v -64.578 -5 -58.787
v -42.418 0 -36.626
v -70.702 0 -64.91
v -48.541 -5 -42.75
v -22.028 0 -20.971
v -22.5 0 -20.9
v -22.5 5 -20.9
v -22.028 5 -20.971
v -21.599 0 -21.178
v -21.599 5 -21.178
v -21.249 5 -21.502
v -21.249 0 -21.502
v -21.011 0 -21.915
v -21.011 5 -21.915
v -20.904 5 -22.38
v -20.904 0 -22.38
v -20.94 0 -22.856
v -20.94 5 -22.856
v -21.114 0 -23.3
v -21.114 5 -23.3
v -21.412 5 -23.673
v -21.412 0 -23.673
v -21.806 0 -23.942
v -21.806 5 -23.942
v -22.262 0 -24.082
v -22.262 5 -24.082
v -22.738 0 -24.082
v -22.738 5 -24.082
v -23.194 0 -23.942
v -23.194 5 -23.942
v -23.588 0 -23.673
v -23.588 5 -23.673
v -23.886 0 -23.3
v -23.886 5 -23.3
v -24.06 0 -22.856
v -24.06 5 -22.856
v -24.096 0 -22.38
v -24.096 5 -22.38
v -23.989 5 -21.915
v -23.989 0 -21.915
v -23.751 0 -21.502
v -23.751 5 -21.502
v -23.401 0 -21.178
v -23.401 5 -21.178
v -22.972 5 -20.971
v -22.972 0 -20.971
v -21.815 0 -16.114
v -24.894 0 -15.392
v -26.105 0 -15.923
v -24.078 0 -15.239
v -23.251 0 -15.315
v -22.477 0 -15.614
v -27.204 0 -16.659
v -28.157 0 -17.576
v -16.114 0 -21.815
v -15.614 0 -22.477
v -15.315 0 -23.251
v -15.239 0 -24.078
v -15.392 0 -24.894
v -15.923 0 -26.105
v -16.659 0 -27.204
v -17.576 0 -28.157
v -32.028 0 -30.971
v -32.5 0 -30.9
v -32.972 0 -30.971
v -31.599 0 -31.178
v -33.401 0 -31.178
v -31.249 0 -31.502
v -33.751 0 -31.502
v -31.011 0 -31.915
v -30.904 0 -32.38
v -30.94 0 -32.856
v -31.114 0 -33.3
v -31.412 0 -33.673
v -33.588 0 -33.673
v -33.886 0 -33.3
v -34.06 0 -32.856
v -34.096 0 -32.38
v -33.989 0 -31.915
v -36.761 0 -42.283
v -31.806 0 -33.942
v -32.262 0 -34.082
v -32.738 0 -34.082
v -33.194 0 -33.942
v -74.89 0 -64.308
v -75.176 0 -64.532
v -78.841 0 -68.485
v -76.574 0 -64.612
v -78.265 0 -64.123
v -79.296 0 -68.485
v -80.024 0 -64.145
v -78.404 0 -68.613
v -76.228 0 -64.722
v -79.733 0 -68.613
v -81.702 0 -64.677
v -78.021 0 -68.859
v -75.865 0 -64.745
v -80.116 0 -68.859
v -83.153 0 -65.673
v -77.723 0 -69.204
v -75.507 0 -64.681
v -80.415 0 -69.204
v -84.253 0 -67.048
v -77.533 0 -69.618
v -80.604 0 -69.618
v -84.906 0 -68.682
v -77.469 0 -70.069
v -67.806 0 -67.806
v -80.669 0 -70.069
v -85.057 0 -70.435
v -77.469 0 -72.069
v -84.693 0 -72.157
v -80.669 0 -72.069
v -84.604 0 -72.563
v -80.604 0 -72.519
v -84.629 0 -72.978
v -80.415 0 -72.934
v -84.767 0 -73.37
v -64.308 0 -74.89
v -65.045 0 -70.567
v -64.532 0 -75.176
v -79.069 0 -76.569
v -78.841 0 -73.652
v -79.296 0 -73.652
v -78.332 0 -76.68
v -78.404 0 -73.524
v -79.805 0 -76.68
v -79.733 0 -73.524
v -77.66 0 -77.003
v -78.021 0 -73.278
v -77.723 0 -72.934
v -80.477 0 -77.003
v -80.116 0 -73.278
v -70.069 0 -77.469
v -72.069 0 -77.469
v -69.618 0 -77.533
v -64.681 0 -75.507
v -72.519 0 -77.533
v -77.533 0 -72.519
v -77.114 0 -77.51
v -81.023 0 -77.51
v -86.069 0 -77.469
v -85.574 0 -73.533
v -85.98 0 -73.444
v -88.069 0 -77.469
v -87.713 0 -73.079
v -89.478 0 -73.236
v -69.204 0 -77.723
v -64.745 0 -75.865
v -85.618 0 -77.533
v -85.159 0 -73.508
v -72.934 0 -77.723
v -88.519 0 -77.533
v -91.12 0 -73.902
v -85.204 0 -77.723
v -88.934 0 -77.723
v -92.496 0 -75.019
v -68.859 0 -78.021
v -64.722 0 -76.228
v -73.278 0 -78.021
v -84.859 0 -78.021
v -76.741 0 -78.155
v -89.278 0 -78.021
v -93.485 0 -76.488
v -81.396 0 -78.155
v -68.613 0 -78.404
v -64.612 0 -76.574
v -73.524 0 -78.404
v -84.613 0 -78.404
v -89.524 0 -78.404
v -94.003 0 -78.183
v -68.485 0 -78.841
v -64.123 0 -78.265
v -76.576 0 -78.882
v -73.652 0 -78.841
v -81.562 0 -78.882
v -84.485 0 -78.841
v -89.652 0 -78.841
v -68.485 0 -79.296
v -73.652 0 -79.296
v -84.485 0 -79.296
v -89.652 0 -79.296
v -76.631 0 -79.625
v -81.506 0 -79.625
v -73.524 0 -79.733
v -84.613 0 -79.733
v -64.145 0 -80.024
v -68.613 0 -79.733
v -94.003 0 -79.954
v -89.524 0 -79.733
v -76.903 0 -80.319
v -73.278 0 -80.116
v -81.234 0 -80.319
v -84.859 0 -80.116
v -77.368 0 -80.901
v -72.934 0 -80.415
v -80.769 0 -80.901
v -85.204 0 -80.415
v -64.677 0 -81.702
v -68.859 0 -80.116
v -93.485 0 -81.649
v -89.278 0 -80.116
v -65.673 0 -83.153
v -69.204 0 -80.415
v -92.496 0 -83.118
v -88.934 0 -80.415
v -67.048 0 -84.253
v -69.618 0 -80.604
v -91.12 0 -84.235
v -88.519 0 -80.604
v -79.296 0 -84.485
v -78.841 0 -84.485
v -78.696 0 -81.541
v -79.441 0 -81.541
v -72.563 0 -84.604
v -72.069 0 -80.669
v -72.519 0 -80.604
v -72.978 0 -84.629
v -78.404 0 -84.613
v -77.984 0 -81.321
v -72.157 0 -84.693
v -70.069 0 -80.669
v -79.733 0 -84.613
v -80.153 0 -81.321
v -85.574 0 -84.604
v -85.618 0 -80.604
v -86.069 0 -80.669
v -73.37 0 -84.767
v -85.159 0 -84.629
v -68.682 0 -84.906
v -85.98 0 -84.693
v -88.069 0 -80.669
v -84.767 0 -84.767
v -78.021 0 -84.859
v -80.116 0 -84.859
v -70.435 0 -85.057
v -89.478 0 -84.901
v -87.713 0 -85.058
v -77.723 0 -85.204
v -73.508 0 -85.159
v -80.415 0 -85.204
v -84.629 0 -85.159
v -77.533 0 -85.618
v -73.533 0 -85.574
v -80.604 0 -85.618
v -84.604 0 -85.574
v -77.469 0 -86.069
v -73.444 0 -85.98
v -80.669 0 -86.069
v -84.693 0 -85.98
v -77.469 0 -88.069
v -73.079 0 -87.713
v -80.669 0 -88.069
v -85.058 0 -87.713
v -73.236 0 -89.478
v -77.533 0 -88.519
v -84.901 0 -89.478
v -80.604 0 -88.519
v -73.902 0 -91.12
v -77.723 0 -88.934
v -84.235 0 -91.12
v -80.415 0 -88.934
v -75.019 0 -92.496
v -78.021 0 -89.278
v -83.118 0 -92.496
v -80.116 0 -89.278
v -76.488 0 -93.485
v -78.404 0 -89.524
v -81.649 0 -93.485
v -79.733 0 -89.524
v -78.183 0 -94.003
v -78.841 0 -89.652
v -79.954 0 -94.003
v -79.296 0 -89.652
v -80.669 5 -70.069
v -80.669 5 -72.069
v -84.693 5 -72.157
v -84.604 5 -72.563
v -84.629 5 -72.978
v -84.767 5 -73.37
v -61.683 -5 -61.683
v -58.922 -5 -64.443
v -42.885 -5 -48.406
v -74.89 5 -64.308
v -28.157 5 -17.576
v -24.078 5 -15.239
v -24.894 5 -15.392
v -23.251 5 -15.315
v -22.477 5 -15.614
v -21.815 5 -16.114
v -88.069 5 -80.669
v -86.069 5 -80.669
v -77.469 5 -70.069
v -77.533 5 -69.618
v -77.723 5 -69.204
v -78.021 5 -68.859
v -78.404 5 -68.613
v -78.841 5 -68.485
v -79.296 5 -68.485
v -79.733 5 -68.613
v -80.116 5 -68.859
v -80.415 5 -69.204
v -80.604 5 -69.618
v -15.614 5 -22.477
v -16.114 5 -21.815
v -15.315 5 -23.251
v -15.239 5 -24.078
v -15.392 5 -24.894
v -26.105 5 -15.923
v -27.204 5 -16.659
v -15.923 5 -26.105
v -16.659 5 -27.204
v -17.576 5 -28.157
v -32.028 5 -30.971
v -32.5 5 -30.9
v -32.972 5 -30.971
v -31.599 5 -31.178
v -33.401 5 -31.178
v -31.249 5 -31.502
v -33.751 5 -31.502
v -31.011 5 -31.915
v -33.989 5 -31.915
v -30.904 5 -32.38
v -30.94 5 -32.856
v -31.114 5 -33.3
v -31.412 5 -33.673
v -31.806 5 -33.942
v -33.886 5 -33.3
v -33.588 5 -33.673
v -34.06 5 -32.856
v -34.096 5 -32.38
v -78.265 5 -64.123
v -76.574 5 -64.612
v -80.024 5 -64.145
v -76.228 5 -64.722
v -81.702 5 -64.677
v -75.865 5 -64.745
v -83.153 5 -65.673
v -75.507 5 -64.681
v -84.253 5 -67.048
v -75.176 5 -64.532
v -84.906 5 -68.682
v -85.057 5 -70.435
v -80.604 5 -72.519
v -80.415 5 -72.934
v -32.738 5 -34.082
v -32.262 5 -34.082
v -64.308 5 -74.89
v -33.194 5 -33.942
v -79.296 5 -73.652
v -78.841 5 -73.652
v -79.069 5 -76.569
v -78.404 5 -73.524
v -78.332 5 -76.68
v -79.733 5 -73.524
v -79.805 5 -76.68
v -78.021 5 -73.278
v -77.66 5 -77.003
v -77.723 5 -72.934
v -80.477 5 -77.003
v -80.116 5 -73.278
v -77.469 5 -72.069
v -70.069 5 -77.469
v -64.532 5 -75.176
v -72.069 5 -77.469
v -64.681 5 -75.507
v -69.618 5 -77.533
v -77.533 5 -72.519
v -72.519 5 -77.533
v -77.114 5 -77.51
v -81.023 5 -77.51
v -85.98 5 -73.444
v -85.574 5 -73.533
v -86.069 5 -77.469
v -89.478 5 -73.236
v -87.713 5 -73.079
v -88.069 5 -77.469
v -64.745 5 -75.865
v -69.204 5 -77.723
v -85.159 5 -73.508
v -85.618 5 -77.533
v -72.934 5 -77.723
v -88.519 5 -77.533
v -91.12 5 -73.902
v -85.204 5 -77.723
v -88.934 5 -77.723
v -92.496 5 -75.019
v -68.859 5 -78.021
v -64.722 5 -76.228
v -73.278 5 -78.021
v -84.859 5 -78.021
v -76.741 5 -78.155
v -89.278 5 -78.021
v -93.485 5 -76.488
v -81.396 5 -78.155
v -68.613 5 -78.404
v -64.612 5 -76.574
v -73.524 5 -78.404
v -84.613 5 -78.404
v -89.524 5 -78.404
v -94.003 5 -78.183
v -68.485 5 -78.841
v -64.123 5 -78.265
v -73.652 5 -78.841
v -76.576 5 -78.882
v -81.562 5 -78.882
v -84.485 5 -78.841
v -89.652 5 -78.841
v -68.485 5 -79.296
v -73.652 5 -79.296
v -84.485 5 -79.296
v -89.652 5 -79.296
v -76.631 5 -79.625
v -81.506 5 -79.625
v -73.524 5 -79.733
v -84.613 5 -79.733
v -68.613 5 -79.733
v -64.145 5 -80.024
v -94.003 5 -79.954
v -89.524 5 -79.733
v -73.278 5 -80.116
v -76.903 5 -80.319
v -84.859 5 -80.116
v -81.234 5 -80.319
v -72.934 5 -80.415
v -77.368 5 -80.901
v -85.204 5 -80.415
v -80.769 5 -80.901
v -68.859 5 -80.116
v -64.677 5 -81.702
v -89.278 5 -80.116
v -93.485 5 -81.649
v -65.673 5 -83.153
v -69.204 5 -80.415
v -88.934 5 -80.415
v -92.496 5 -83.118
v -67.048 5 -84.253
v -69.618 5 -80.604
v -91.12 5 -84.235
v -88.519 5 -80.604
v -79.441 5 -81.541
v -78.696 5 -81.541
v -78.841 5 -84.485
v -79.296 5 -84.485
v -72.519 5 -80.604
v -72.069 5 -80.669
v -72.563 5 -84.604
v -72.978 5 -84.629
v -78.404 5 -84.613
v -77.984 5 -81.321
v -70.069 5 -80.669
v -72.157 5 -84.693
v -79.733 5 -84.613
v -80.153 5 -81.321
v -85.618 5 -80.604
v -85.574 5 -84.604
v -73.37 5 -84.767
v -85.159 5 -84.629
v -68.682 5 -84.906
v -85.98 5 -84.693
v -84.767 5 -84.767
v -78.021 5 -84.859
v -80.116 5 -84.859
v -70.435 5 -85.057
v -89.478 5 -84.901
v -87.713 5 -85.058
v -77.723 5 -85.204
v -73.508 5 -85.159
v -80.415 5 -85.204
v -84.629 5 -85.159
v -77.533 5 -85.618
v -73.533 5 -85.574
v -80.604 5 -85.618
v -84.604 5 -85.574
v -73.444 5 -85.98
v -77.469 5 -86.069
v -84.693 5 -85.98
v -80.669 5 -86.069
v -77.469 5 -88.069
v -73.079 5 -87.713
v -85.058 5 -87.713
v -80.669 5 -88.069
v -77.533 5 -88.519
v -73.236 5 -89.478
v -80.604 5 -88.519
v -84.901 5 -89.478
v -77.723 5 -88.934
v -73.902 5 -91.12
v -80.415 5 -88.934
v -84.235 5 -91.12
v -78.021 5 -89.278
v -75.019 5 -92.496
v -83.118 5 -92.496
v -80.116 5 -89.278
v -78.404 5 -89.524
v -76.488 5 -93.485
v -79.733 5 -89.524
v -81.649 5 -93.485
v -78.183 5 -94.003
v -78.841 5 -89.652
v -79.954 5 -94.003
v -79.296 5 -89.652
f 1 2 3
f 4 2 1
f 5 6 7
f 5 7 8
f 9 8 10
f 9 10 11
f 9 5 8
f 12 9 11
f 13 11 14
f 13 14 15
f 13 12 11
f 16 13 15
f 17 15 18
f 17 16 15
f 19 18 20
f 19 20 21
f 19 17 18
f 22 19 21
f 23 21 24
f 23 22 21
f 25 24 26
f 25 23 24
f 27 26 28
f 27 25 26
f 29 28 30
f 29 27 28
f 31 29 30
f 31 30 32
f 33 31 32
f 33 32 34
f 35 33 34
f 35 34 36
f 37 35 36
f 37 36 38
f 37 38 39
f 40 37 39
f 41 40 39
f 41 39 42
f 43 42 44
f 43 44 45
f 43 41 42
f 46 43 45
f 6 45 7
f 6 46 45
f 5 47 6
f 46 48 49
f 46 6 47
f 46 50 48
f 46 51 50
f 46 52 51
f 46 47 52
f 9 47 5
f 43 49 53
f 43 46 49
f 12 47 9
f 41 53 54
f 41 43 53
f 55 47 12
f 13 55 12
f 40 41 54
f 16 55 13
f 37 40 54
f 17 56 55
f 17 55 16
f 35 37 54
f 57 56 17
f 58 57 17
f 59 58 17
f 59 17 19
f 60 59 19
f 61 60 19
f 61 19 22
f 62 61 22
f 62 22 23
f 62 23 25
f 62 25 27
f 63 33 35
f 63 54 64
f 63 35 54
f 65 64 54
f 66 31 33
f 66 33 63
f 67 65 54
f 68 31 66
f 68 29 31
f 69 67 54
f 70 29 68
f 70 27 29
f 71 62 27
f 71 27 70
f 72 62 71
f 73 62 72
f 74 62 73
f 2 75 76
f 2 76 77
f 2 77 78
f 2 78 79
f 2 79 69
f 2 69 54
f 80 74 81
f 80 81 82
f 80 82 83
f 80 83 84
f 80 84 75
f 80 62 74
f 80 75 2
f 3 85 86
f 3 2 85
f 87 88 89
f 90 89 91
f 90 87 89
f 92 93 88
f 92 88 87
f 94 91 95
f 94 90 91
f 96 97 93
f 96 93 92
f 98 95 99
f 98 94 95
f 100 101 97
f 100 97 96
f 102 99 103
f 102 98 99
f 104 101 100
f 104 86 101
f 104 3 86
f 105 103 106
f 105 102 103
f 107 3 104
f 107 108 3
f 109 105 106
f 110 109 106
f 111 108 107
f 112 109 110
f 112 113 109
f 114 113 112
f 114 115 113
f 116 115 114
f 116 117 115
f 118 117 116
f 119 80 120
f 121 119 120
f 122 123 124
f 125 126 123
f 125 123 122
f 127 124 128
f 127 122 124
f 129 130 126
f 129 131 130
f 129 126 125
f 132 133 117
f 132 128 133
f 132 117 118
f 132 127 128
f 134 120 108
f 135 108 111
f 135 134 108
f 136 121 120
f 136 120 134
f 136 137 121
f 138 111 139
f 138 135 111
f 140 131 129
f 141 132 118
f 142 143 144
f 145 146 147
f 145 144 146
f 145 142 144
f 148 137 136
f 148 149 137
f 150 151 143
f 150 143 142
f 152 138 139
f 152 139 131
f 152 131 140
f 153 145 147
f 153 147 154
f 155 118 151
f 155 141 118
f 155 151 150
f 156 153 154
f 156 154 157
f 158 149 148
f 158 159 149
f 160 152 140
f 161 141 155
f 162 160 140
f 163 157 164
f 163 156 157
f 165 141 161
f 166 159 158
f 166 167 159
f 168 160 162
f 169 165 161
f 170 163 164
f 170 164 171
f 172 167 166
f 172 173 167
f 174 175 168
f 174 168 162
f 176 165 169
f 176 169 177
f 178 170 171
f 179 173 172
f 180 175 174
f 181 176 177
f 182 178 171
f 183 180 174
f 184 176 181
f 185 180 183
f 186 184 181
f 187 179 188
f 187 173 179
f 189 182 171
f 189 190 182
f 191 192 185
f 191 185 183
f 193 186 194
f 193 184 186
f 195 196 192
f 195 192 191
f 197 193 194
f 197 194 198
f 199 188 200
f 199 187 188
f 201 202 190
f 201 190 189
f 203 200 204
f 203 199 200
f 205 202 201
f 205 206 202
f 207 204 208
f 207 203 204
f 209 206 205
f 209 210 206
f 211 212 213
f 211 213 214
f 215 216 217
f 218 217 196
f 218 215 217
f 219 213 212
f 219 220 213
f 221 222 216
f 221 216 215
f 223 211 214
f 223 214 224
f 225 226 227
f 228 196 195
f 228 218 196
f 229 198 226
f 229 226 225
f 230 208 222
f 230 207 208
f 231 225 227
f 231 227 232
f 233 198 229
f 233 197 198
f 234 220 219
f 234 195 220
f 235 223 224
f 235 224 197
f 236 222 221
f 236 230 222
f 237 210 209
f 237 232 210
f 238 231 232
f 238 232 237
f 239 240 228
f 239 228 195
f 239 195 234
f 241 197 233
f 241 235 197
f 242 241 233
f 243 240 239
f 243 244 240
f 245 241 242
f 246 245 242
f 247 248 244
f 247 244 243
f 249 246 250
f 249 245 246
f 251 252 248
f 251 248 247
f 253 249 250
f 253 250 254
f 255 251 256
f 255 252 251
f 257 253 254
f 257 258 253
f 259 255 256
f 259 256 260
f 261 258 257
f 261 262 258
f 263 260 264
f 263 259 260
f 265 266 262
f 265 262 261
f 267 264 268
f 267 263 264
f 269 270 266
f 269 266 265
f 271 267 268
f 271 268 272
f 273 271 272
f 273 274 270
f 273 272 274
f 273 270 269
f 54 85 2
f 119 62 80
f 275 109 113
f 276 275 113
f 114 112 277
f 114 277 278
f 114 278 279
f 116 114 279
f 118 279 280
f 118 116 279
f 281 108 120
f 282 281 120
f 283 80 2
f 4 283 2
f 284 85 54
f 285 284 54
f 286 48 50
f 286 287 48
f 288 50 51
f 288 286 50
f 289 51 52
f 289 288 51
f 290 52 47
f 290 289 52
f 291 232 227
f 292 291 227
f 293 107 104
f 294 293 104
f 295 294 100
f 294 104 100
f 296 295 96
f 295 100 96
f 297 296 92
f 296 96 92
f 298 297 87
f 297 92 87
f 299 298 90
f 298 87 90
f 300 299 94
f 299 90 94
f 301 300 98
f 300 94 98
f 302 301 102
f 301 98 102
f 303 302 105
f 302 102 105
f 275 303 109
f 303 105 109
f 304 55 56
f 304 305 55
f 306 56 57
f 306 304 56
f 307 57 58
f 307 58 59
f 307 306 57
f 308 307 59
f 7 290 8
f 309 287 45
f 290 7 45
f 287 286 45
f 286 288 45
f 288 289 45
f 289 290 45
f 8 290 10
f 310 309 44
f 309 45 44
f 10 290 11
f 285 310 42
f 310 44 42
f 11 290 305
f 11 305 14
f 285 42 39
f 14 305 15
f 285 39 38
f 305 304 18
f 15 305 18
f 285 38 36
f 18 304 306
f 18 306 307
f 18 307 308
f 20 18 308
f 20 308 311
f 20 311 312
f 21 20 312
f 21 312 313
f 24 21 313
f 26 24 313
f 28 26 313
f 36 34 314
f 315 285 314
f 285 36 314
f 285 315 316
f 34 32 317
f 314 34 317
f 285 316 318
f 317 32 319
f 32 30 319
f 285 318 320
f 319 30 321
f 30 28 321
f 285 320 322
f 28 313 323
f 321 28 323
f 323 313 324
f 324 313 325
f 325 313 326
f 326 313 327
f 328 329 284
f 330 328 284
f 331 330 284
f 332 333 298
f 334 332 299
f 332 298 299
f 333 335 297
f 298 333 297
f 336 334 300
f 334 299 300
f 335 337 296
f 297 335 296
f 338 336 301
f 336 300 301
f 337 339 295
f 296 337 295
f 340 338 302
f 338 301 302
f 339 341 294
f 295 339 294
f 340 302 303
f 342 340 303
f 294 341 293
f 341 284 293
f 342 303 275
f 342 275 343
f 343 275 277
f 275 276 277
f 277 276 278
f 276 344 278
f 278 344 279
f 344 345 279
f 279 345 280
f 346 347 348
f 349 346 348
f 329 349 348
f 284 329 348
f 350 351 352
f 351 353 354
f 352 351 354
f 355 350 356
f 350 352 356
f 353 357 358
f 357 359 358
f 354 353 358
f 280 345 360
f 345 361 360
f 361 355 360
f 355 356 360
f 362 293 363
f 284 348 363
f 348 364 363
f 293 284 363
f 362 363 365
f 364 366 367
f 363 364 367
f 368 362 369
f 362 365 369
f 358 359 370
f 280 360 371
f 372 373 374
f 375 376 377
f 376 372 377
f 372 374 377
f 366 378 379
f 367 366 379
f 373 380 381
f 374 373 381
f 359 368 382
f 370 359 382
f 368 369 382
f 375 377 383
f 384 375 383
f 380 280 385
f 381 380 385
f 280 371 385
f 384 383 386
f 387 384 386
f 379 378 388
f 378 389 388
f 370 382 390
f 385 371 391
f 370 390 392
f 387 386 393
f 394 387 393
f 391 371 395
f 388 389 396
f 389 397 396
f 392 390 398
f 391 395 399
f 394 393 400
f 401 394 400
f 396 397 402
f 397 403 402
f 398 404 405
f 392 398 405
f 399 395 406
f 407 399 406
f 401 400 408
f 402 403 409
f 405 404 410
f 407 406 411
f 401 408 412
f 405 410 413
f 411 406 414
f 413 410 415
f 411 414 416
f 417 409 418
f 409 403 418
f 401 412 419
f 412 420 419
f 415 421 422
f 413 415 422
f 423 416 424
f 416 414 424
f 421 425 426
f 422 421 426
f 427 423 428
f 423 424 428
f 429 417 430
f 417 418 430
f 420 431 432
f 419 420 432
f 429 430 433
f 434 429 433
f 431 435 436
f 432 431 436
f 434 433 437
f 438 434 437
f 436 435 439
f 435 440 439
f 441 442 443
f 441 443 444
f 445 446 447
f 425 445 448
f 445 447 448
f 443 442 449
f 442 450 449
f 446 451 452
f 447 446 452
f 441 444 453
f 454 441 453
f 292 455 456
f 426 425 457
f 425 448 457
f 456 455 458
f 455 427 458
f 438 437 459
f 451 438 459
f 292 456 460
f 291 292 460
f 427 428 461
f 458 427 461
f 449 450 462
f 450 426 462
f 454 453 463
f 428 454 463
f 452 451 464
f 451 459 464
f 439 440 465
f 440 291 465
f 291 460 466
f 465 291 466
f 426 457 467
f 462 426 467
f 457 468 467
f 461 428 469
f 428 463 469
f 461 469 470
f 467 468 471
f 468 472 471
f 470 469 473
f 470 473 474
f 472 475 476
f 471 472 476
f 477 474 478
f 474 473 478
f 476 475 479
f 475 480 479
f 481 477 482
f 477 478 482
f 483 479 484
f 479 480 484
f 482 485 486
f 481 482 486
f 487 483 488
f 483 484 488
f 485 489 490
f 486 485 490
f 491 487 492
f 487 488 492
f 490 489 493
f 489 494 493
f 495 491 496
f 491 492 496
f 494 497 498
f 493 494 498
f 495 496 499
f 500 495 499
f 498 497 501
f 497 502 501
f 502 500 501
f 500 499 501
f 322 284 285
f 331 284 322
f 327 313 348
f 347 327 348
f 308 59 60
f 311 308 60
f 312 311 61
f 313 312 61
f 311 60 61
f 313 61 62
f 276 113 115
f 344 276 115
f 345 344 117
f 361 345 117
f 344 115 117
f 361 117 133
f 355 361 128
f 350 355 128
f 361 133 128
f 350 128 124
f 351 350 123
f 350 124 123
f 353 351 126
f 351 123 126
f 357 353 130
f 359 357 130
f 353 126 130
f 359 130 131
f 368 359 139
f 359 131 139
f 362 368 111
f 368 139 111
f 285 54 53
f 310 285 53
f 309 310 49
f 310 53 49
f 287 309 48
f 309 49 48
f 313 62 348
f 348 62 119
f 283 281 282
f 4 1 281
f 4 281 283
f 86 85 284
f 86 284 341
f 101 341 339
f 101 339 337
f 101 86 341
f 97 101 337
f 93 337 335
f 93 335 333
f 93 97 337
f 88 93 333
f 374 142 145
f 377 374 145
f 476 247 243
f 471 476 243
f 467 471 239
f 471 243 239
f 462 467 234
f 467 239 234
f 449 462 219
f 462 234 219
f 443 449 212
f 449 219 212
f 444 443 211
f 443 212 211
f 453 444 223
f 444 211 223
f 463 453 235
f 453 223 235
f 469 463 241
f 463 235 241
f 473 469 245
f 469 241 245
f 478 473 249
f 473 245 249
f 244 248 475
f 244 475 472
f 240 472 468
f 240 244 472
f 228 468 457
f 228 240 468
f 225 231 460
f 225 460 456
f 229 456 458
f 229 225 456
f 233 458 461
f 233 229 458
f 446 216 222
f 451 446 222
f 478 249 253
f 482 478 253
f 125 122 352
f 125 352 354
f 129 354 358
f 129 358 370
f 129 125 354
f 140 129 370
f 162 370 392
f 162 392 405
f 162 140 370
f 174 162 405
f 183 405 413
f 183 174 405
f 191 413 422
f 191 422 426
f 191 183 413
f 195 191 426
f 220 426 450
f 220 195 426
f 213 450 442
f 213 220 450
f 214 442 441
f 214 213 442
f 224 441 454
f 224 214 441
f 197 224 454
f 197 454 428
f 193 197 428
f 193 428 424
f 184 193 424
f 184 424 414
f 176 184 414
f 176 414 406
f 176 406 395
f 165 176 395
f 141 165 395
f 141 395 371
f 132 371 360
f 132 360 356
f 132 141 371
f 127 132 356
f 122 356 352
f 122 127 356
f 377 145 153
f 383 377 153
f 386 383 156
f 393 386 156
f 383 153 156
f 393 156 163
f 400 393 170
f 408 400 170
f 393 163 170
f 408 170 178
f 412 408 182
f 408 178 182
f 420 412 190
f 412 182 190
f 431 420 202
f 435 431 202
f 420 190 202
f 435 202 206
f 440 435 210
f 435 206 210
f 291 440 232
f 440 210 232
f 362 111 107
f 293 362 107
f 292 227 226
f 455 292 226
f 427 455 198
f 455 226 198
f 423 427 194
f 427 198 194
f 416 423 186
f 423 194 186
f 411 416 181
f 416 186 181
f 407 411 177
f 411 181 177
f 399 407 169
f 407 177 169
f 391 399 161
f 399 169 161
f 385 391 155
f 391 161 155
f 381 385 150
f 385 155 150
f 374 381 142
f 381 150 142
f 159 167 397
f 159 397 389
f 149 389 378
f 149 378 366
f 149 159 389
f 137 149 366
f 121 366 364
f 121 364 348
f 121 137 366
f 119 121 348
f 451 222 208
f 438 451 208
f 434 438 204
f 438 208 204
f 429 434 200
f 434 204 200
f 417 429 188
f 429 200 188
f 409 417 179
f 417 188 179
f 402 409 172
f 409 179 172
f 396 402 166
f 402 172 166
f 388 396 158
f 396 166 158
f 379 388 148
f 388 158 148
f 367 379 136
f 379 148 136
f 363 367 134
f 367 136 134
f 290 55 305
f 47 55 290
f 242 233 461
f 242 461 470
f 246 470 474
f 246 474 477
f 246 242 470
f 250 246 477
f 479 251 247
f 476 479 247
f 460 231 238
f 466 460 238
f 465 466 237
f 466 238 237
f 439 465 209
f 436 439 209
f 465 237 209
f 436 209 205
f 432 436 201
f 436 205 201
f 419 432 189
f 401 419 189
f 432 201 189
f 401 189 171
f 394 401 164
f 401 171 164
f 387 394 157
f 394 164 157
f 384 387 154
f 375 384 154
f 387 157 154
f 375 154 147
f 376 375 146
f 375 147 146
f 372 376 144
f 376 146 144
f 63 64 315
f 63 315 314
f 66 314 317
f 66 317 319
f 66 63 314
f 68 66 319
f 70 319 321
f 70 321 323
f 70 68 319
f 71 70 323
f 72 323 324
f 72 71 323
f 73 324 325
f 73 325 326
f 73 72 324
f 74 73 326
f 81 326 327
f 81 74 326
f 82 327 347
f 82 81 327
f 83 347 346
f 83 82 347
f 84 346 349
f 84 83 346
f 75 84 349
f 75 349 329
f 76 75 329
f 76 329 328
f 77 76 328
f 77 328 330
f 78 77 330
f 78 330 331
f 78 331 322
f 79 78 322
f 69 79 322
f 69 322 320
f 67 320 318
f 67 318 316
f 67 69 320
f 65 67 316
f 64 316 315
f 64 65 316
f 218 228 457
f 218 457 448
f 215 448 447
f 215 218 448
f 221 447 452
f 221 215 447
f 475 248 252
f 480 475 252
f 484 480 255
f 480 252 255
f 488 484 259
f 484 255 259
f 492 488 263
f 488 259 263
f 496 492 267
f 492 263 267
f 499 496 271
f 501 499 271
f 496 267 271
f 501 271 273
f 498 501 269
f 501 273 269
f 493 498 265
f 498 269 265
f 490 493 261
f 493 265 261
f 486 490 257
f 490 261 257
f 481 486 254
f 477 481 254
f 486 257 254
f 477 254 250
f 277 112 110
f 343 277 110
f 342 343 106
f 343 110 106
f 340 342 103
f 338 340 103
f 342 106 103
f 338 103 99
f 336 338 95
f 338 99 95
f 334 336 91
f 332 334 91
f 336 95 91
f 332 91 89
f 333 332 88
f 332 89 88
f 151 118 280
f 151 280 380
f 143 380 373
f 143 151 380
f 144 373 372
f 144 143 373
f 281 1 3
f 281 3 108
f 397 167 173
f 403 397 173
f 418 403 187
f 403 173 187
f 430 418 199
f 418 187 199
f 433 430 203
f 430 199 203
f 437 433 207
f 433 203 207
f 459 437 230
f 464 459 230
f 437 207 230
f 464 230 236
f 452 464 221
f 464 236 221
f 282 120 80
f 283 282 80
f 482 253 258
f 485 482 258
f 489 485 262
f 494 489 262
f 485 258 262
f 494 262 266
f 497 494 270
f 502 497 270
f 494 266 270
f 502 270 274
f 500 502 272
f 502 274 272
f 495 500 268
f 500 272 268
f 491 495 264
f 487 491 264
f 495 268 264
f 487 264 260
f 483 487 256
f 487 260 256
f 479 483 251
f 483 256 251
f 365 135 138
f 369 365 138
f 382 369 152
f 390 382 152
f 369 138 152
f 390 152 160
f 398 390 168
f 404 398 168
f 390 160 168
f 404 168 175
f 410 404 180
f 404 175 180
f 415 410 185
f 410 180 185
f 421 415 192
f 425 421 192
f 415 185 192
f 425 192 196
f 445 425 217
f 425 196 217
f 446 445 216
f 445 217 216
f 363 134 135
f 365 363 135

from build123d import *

# Parameters (mm, degrees)
SKETCH1_R           = 1.6
SKETCH1_R_2         = 2.5
BOSS_EXTRUDE1_DEPTH = 5
FILLET1_R           = 1.5
CUT_EXTRUDE1_START  = -10
CUT_EXTRUDE1_DEPTH  = 10
FILLET2_R           = 3
BOSS_EXTRUDE2_DEPTH = 5
CHAMFER1_SIZE2      = 8.660254038
CHAMFER1_SIZE       = 5
CHAMFER2_SIZE2      = 5
CHAMFER2_SIZE       = 8.660254038


# Some blends are built 0.0001 mm under size
with BuildPart() as part:
    # Sketch1 → Boss-Extrude1 (new body)
    with BuildSketch(Plane(origin=(0, 0, 0), x_dir=(1, 0, 0), z_dir=(0, 1, 0))):
        with BuildLine():
            ThreePointArc((-85.12409805, 73.840708631), (-84.725396744, 73.411688245), (-84.296376359, 73.012986939))
            ThreePointArc((-84.296376359, 73.012986939), (-83.127079594, 65.649461526), (-75.690864757, 65.109581606))
            Line((-75.690864757, 65.109581606), (-28.156854249, 17.575571099))
            ThreePointArc((-28.156854249, 17.575571099), (-17.196699141, 17.196699141), (-17.575571099, 28.156854249))
            Line((-17.575571099, 28.156854249), (-65.109581606, 75.690864757))
            ThreePointArc((-65.109581606, 75.690864757), (-65.649461526, 83.127079594), (-73.012986939, 84.296376359))
            ThreePointArc((-73.012986939, 84.296376359), (-73.411688245, 84.725396744), (-73.840708631, 85.12409805))
            ThreePointArc((-73.840708631, 85.12409805), (-79.068542495, 94.068542495), (-84.296376359, 85.12409805))
            ThreePointArc((-84.296376359, 85.12409805), (-84.725396744, 84.725396744), (-85.12409805, 84.296376359))
            ThreePointArc((-85.12409805, 84.296376359), (-94.068542495, 79.068542495), (-85.12409805, 73.840708631))
        make_face()
        with BuildLine():
            Line((-80.668542495, 86.068542495), (-80.668542495, 88.068542495))
            ThreePointArc((-80.668542495, 88.068542495), (-79.068542495, 89.668542495), (-77.468542495, 88.068542495))
            Line((-77.468542495, 88.068542495), (-77.468542495, 86.068542495))
            ThreePointArc((-77.468542495, 86.068542495), (-79.068542495, 84.468542495), (-80.668542495, 86.068542495))
        make_face(mode=Mode.SUBTRACT)
        with Locations(Location((-22.5, 22.5, 0), (0, 0, 270))):
            Circle(SKETCH1_R, mode=Mode.SUBTRACT)
        with Locations(Location((-32.5, 32.5, 0), (0, 0, 270))):
            Circle(SKETCH1_R, mode=Mode.SUBTRACT)
        with BuildLine():
            Line((-80.668542495, 70.068542495), (-80.668542495, 72.068542495))
            ThreePointArc((-80.668542495, 72.068542495), (-79.068542495, 73.668542495), (-77.468542495, 72.068542495))
            Line((-77.468542495, 72.068542495), (-77.468542495, 70.068542495))
            ThreePointArc((-77.468542495, 70.068542495), (-79.068542495, 68.468542495), (-80.668542495, 70.068542495))
        make_face(mode=Mode.SUBTRACT)
        with BuildLine():
            Line((-86.068542495, 77.468542495), (-88.068542495, 77.468542495))
            ThreePointArc((-88.068542495, 77.468542495), (-89.668542495, 79.068542495), (-88.068542495, 80.668542495))
            Line((-88.068542495, 80.668542495), (-86.068542495, 80.668542495))
            ThreePointArc((-86.068542495, 80.668542495), (-84.468542495, 79.068542495), (-86.068542495, 77.468542495))
        make_face(mode=Mode.SUBTRACT)
        with Locations(Location((-79.068542495, 79.068542495, 0), (0, 0, 270))):
            Circle(SKETCH1_R_2, mode=Mode.SUBTRACT)
        with BuildLine():
            ThreePointArc((-70.068542495, 80.668542495), (-68.468542495, 79.068542495), (-70.068542495, 77.468542495))
            Line((-70.068542495, 77.468542495), (-72.068542495, 77.468542495))
            ThreePointArc((-72.068542495, 77.468542495), (-73.668542495, 79.068542495), (-72.068542495, 80.668542495))
            Line((-72.068542495, 80.668542495), (-70.068542495, 80.668542495))
        make_face(mode=Mode.SUBTRACT)
    extrude(amount=BOSS_EXTRUDE1_DEPTH)

    # Fillet1
    # the kernel refuses this fillet: 1.5 mm, written as the material it adds along each edge
    with BuildSketch(Plane(origin=(-75.690864757, 0, -65.109581606), x_dir=(-0.8710919006324759, 0, 0.4911200470887958), z_dir=(0, 1, 0))) as fillet1_piece_1:
        with BuildLine():
            CenterArc((1.140350885, 1.494638979), FILLET1_R, 195.585774364, 69.56865207)
            Line((-0.304493073, 1.091617967), (0, 0))
            ThreePointArc((0, 0), (0.506822616, 0.021444084), (1.013645231, 0))
        make_face()
    extrude(amount=5)
    with BuildSketch(Plane(origin=(-65.109581606, 0, -75.690864757), x_dir=(0.70710678118656, 0, 0.7071067811865349), z_dir=(0, 1, 0))) as fillet1_piece_2:
        with BuildLine():
            CenterArc((1.133289821, 1.5), FILLET1_R, 200.43134793, 69.56865207)
            ThreePointArc((-0.272346884, 0.976372792), (-0.115517872, 0.493948007), (0, 0))
            Line((0, 0), (1.133289821, 0))
        make_face()
    extrude(amount=5)
    with BuildSketch(Plane(origin=(-84.296376359, 0, -85.12409805), x_dir=(-0.7160400781456726, 0, 0.6980591711947771), z_dir=(0, 1, 0))) as fillet1_piece_3:
        with BuildLine():
            CenterArc((1.058307083, -1.497254596), FILLET1_R, 93.467060005, 62.635531643)
            ThreePointArc((-0.313101337, -0.889604248), (-0.139044818, -0.450963409), (0, 0))
            ThreePointArc((0, 0), (0.483797523, -0.014642152), (0.967595047, 0))
        make_face()
    extrude(amount=5)
    with BuildSketch(Plane(origin=(-73.840708631, 0, -85.12409805), x_dir=(0.7160400781456655, 0, 0.6980591711947844), z_dir=(0, 1, 0)), Plane(origin=(-85.12409805, 0, -84.296376359), x_dir=(0.698059171194804, 0, -0.7160400781456464), z_dir=(0, 1, 0)), Plane(origin=(-84.296376359, 0, -73.012986939), x_dir=(-0.716040078145762, 0, -0.6980591711946854), z_dir=(0, 1, 0))) as fillet1_piece_4:
        with BuildLine():
            CenterArc((1.058307083, 1.497254596), FILLET1_R, 203.897408353, 62.635531643)
            ThreePointArc((-0.313101337, 0.889604248), (-0.139044818, 0.450963409), (0, 0))
            ThreePointArc((0, 0), (0.483797523, 0.014642152), (0.967595047, 0))
        make_face()
    extrude(amount=5)
    with BuildSketch(Plane(origin=(-73.012986939, 0, -84.296376359), x_dir=(0.9071785576189849, 0, -0.42074584323120545), z_dir=(0, 1, 0)), Plane(origin=(-85.12409805, 0, -73.840708631), x_dir=(-0.9071785576191526, 0, 0.4207458432308441), z_dir=(0, 1, 0))) as fillet1_piece_5:
        with BuildLine():
            CenterArc((1.060981867, 1.495360386), FILLET1_R, 202.856873055, 62.635531643)
            ThreePointArc((-0.321235194, 0.912714701), (-0.146805923, 0.461218449), (0, 0))
            ThreePointArc((0, 0), (0.471547497, 0.018558455), (0.943094993, 0))
        make_face()
    extrude(amount=5)

    # Sketch4 → Cut-Extrude1 (cut)
    with BuildSketch(Plane(origin=(0, 5, 0), x_dir=(1, 0, 0), z_dir=(0, 1, 0)).offset(CUT_EXTRUDE1_START)):
        with BuildLine():
            Line((-15.011619019, 22.917313169), (-18.964466094, 18.964466094))
            Line((-18.964466094, 18.964466094), (-17.196699141, 17.196699141))
            ThreePointArc((-17.196699141, 17.196699141), (-15.493707308, 19.823834327), (-15.011619019, 22.917313169))
        make_face()
        with BuildLine():
            Line((-17.196699141, 17.196699141), (-18.964466094, 18.964466094))
            Line((-18.964466094, 18.964466094), (-22.917313169, 15.011619019))
            ThreePointArc((-22.917313169, 15.011619019), (-19.823834327, 15.493707308), (-17.196699141, 17.196699141))
        make_face()
    extrude(amount=CUT_EXTRUDE1_DEPTH, mode=Mode.SUBTRACT)

    # Fillet2
    fillet2_edges = [part.edges().sort_by_distance(p)[0] for p in [
        (-22.917313169, 2.5, -15.011619019),
        (-15.011619019, 2.5, -22.917313169),
    ]]
    fillet(fillet2_edges, radius=FILLET2_R)

    # Sketch5 → Boss-Extrude2 (add)
    with BuildSketch(Plane.XZ):
        Polygon((-70.70206426, -64.910255721), (-67.806159991, -67.806159991), (-39.521888743, -39.521888743), (-42.417793012, -36.625984474), align=None)
        Polygon((-39.521888743, -39.521888743), (-67.806159991, -67.806159991), (-65.04521001, -70.567109971), (-36.760938763, -42.282838723), align=None)
    extrude(amount=BOSS_EXTRUDE2_DEPTH)

    # Chamfer1
    chamfer1_edges = [part.edges().sort_by_distance(p)[0] for p in [
        (-67.873637135, -5, -67.738682846),
    ]]
    chamfer1_side = [part.faces().sort_by_distance(p)[0] for p in [
        (-67.873637135, -4.9, -67.738682846),
    ]]
    chamfer(chamfer1_edges, length=CHAMFER1_SIZE - 0.0001, length2=CHAMFER1_SIZE2 - 0.0001, reference=chamfer1_side[0])  # a hair under: the kernel refuses the full size

    # Chamfer2
    chamfer2_edges = [part.edges().sort_by_distance(p)[0] for p in [
        (-39.589365887, -5, -39.454411599),
    ]]
    chamfer2_side = [part.faces().sort_by_distance(p)[0] for p in [
        (-39.660076566, -5, -39.525122277),
    ]]
    chamfer(chamfer2_edges, length=CHAMFER2_SIZE - 0.0001, length2=CHAMFER2_SIZE2 - 0.0001, reference=chamfer2_side[0])  # a hair under: the kernel refuses the full size


solid = part.part
